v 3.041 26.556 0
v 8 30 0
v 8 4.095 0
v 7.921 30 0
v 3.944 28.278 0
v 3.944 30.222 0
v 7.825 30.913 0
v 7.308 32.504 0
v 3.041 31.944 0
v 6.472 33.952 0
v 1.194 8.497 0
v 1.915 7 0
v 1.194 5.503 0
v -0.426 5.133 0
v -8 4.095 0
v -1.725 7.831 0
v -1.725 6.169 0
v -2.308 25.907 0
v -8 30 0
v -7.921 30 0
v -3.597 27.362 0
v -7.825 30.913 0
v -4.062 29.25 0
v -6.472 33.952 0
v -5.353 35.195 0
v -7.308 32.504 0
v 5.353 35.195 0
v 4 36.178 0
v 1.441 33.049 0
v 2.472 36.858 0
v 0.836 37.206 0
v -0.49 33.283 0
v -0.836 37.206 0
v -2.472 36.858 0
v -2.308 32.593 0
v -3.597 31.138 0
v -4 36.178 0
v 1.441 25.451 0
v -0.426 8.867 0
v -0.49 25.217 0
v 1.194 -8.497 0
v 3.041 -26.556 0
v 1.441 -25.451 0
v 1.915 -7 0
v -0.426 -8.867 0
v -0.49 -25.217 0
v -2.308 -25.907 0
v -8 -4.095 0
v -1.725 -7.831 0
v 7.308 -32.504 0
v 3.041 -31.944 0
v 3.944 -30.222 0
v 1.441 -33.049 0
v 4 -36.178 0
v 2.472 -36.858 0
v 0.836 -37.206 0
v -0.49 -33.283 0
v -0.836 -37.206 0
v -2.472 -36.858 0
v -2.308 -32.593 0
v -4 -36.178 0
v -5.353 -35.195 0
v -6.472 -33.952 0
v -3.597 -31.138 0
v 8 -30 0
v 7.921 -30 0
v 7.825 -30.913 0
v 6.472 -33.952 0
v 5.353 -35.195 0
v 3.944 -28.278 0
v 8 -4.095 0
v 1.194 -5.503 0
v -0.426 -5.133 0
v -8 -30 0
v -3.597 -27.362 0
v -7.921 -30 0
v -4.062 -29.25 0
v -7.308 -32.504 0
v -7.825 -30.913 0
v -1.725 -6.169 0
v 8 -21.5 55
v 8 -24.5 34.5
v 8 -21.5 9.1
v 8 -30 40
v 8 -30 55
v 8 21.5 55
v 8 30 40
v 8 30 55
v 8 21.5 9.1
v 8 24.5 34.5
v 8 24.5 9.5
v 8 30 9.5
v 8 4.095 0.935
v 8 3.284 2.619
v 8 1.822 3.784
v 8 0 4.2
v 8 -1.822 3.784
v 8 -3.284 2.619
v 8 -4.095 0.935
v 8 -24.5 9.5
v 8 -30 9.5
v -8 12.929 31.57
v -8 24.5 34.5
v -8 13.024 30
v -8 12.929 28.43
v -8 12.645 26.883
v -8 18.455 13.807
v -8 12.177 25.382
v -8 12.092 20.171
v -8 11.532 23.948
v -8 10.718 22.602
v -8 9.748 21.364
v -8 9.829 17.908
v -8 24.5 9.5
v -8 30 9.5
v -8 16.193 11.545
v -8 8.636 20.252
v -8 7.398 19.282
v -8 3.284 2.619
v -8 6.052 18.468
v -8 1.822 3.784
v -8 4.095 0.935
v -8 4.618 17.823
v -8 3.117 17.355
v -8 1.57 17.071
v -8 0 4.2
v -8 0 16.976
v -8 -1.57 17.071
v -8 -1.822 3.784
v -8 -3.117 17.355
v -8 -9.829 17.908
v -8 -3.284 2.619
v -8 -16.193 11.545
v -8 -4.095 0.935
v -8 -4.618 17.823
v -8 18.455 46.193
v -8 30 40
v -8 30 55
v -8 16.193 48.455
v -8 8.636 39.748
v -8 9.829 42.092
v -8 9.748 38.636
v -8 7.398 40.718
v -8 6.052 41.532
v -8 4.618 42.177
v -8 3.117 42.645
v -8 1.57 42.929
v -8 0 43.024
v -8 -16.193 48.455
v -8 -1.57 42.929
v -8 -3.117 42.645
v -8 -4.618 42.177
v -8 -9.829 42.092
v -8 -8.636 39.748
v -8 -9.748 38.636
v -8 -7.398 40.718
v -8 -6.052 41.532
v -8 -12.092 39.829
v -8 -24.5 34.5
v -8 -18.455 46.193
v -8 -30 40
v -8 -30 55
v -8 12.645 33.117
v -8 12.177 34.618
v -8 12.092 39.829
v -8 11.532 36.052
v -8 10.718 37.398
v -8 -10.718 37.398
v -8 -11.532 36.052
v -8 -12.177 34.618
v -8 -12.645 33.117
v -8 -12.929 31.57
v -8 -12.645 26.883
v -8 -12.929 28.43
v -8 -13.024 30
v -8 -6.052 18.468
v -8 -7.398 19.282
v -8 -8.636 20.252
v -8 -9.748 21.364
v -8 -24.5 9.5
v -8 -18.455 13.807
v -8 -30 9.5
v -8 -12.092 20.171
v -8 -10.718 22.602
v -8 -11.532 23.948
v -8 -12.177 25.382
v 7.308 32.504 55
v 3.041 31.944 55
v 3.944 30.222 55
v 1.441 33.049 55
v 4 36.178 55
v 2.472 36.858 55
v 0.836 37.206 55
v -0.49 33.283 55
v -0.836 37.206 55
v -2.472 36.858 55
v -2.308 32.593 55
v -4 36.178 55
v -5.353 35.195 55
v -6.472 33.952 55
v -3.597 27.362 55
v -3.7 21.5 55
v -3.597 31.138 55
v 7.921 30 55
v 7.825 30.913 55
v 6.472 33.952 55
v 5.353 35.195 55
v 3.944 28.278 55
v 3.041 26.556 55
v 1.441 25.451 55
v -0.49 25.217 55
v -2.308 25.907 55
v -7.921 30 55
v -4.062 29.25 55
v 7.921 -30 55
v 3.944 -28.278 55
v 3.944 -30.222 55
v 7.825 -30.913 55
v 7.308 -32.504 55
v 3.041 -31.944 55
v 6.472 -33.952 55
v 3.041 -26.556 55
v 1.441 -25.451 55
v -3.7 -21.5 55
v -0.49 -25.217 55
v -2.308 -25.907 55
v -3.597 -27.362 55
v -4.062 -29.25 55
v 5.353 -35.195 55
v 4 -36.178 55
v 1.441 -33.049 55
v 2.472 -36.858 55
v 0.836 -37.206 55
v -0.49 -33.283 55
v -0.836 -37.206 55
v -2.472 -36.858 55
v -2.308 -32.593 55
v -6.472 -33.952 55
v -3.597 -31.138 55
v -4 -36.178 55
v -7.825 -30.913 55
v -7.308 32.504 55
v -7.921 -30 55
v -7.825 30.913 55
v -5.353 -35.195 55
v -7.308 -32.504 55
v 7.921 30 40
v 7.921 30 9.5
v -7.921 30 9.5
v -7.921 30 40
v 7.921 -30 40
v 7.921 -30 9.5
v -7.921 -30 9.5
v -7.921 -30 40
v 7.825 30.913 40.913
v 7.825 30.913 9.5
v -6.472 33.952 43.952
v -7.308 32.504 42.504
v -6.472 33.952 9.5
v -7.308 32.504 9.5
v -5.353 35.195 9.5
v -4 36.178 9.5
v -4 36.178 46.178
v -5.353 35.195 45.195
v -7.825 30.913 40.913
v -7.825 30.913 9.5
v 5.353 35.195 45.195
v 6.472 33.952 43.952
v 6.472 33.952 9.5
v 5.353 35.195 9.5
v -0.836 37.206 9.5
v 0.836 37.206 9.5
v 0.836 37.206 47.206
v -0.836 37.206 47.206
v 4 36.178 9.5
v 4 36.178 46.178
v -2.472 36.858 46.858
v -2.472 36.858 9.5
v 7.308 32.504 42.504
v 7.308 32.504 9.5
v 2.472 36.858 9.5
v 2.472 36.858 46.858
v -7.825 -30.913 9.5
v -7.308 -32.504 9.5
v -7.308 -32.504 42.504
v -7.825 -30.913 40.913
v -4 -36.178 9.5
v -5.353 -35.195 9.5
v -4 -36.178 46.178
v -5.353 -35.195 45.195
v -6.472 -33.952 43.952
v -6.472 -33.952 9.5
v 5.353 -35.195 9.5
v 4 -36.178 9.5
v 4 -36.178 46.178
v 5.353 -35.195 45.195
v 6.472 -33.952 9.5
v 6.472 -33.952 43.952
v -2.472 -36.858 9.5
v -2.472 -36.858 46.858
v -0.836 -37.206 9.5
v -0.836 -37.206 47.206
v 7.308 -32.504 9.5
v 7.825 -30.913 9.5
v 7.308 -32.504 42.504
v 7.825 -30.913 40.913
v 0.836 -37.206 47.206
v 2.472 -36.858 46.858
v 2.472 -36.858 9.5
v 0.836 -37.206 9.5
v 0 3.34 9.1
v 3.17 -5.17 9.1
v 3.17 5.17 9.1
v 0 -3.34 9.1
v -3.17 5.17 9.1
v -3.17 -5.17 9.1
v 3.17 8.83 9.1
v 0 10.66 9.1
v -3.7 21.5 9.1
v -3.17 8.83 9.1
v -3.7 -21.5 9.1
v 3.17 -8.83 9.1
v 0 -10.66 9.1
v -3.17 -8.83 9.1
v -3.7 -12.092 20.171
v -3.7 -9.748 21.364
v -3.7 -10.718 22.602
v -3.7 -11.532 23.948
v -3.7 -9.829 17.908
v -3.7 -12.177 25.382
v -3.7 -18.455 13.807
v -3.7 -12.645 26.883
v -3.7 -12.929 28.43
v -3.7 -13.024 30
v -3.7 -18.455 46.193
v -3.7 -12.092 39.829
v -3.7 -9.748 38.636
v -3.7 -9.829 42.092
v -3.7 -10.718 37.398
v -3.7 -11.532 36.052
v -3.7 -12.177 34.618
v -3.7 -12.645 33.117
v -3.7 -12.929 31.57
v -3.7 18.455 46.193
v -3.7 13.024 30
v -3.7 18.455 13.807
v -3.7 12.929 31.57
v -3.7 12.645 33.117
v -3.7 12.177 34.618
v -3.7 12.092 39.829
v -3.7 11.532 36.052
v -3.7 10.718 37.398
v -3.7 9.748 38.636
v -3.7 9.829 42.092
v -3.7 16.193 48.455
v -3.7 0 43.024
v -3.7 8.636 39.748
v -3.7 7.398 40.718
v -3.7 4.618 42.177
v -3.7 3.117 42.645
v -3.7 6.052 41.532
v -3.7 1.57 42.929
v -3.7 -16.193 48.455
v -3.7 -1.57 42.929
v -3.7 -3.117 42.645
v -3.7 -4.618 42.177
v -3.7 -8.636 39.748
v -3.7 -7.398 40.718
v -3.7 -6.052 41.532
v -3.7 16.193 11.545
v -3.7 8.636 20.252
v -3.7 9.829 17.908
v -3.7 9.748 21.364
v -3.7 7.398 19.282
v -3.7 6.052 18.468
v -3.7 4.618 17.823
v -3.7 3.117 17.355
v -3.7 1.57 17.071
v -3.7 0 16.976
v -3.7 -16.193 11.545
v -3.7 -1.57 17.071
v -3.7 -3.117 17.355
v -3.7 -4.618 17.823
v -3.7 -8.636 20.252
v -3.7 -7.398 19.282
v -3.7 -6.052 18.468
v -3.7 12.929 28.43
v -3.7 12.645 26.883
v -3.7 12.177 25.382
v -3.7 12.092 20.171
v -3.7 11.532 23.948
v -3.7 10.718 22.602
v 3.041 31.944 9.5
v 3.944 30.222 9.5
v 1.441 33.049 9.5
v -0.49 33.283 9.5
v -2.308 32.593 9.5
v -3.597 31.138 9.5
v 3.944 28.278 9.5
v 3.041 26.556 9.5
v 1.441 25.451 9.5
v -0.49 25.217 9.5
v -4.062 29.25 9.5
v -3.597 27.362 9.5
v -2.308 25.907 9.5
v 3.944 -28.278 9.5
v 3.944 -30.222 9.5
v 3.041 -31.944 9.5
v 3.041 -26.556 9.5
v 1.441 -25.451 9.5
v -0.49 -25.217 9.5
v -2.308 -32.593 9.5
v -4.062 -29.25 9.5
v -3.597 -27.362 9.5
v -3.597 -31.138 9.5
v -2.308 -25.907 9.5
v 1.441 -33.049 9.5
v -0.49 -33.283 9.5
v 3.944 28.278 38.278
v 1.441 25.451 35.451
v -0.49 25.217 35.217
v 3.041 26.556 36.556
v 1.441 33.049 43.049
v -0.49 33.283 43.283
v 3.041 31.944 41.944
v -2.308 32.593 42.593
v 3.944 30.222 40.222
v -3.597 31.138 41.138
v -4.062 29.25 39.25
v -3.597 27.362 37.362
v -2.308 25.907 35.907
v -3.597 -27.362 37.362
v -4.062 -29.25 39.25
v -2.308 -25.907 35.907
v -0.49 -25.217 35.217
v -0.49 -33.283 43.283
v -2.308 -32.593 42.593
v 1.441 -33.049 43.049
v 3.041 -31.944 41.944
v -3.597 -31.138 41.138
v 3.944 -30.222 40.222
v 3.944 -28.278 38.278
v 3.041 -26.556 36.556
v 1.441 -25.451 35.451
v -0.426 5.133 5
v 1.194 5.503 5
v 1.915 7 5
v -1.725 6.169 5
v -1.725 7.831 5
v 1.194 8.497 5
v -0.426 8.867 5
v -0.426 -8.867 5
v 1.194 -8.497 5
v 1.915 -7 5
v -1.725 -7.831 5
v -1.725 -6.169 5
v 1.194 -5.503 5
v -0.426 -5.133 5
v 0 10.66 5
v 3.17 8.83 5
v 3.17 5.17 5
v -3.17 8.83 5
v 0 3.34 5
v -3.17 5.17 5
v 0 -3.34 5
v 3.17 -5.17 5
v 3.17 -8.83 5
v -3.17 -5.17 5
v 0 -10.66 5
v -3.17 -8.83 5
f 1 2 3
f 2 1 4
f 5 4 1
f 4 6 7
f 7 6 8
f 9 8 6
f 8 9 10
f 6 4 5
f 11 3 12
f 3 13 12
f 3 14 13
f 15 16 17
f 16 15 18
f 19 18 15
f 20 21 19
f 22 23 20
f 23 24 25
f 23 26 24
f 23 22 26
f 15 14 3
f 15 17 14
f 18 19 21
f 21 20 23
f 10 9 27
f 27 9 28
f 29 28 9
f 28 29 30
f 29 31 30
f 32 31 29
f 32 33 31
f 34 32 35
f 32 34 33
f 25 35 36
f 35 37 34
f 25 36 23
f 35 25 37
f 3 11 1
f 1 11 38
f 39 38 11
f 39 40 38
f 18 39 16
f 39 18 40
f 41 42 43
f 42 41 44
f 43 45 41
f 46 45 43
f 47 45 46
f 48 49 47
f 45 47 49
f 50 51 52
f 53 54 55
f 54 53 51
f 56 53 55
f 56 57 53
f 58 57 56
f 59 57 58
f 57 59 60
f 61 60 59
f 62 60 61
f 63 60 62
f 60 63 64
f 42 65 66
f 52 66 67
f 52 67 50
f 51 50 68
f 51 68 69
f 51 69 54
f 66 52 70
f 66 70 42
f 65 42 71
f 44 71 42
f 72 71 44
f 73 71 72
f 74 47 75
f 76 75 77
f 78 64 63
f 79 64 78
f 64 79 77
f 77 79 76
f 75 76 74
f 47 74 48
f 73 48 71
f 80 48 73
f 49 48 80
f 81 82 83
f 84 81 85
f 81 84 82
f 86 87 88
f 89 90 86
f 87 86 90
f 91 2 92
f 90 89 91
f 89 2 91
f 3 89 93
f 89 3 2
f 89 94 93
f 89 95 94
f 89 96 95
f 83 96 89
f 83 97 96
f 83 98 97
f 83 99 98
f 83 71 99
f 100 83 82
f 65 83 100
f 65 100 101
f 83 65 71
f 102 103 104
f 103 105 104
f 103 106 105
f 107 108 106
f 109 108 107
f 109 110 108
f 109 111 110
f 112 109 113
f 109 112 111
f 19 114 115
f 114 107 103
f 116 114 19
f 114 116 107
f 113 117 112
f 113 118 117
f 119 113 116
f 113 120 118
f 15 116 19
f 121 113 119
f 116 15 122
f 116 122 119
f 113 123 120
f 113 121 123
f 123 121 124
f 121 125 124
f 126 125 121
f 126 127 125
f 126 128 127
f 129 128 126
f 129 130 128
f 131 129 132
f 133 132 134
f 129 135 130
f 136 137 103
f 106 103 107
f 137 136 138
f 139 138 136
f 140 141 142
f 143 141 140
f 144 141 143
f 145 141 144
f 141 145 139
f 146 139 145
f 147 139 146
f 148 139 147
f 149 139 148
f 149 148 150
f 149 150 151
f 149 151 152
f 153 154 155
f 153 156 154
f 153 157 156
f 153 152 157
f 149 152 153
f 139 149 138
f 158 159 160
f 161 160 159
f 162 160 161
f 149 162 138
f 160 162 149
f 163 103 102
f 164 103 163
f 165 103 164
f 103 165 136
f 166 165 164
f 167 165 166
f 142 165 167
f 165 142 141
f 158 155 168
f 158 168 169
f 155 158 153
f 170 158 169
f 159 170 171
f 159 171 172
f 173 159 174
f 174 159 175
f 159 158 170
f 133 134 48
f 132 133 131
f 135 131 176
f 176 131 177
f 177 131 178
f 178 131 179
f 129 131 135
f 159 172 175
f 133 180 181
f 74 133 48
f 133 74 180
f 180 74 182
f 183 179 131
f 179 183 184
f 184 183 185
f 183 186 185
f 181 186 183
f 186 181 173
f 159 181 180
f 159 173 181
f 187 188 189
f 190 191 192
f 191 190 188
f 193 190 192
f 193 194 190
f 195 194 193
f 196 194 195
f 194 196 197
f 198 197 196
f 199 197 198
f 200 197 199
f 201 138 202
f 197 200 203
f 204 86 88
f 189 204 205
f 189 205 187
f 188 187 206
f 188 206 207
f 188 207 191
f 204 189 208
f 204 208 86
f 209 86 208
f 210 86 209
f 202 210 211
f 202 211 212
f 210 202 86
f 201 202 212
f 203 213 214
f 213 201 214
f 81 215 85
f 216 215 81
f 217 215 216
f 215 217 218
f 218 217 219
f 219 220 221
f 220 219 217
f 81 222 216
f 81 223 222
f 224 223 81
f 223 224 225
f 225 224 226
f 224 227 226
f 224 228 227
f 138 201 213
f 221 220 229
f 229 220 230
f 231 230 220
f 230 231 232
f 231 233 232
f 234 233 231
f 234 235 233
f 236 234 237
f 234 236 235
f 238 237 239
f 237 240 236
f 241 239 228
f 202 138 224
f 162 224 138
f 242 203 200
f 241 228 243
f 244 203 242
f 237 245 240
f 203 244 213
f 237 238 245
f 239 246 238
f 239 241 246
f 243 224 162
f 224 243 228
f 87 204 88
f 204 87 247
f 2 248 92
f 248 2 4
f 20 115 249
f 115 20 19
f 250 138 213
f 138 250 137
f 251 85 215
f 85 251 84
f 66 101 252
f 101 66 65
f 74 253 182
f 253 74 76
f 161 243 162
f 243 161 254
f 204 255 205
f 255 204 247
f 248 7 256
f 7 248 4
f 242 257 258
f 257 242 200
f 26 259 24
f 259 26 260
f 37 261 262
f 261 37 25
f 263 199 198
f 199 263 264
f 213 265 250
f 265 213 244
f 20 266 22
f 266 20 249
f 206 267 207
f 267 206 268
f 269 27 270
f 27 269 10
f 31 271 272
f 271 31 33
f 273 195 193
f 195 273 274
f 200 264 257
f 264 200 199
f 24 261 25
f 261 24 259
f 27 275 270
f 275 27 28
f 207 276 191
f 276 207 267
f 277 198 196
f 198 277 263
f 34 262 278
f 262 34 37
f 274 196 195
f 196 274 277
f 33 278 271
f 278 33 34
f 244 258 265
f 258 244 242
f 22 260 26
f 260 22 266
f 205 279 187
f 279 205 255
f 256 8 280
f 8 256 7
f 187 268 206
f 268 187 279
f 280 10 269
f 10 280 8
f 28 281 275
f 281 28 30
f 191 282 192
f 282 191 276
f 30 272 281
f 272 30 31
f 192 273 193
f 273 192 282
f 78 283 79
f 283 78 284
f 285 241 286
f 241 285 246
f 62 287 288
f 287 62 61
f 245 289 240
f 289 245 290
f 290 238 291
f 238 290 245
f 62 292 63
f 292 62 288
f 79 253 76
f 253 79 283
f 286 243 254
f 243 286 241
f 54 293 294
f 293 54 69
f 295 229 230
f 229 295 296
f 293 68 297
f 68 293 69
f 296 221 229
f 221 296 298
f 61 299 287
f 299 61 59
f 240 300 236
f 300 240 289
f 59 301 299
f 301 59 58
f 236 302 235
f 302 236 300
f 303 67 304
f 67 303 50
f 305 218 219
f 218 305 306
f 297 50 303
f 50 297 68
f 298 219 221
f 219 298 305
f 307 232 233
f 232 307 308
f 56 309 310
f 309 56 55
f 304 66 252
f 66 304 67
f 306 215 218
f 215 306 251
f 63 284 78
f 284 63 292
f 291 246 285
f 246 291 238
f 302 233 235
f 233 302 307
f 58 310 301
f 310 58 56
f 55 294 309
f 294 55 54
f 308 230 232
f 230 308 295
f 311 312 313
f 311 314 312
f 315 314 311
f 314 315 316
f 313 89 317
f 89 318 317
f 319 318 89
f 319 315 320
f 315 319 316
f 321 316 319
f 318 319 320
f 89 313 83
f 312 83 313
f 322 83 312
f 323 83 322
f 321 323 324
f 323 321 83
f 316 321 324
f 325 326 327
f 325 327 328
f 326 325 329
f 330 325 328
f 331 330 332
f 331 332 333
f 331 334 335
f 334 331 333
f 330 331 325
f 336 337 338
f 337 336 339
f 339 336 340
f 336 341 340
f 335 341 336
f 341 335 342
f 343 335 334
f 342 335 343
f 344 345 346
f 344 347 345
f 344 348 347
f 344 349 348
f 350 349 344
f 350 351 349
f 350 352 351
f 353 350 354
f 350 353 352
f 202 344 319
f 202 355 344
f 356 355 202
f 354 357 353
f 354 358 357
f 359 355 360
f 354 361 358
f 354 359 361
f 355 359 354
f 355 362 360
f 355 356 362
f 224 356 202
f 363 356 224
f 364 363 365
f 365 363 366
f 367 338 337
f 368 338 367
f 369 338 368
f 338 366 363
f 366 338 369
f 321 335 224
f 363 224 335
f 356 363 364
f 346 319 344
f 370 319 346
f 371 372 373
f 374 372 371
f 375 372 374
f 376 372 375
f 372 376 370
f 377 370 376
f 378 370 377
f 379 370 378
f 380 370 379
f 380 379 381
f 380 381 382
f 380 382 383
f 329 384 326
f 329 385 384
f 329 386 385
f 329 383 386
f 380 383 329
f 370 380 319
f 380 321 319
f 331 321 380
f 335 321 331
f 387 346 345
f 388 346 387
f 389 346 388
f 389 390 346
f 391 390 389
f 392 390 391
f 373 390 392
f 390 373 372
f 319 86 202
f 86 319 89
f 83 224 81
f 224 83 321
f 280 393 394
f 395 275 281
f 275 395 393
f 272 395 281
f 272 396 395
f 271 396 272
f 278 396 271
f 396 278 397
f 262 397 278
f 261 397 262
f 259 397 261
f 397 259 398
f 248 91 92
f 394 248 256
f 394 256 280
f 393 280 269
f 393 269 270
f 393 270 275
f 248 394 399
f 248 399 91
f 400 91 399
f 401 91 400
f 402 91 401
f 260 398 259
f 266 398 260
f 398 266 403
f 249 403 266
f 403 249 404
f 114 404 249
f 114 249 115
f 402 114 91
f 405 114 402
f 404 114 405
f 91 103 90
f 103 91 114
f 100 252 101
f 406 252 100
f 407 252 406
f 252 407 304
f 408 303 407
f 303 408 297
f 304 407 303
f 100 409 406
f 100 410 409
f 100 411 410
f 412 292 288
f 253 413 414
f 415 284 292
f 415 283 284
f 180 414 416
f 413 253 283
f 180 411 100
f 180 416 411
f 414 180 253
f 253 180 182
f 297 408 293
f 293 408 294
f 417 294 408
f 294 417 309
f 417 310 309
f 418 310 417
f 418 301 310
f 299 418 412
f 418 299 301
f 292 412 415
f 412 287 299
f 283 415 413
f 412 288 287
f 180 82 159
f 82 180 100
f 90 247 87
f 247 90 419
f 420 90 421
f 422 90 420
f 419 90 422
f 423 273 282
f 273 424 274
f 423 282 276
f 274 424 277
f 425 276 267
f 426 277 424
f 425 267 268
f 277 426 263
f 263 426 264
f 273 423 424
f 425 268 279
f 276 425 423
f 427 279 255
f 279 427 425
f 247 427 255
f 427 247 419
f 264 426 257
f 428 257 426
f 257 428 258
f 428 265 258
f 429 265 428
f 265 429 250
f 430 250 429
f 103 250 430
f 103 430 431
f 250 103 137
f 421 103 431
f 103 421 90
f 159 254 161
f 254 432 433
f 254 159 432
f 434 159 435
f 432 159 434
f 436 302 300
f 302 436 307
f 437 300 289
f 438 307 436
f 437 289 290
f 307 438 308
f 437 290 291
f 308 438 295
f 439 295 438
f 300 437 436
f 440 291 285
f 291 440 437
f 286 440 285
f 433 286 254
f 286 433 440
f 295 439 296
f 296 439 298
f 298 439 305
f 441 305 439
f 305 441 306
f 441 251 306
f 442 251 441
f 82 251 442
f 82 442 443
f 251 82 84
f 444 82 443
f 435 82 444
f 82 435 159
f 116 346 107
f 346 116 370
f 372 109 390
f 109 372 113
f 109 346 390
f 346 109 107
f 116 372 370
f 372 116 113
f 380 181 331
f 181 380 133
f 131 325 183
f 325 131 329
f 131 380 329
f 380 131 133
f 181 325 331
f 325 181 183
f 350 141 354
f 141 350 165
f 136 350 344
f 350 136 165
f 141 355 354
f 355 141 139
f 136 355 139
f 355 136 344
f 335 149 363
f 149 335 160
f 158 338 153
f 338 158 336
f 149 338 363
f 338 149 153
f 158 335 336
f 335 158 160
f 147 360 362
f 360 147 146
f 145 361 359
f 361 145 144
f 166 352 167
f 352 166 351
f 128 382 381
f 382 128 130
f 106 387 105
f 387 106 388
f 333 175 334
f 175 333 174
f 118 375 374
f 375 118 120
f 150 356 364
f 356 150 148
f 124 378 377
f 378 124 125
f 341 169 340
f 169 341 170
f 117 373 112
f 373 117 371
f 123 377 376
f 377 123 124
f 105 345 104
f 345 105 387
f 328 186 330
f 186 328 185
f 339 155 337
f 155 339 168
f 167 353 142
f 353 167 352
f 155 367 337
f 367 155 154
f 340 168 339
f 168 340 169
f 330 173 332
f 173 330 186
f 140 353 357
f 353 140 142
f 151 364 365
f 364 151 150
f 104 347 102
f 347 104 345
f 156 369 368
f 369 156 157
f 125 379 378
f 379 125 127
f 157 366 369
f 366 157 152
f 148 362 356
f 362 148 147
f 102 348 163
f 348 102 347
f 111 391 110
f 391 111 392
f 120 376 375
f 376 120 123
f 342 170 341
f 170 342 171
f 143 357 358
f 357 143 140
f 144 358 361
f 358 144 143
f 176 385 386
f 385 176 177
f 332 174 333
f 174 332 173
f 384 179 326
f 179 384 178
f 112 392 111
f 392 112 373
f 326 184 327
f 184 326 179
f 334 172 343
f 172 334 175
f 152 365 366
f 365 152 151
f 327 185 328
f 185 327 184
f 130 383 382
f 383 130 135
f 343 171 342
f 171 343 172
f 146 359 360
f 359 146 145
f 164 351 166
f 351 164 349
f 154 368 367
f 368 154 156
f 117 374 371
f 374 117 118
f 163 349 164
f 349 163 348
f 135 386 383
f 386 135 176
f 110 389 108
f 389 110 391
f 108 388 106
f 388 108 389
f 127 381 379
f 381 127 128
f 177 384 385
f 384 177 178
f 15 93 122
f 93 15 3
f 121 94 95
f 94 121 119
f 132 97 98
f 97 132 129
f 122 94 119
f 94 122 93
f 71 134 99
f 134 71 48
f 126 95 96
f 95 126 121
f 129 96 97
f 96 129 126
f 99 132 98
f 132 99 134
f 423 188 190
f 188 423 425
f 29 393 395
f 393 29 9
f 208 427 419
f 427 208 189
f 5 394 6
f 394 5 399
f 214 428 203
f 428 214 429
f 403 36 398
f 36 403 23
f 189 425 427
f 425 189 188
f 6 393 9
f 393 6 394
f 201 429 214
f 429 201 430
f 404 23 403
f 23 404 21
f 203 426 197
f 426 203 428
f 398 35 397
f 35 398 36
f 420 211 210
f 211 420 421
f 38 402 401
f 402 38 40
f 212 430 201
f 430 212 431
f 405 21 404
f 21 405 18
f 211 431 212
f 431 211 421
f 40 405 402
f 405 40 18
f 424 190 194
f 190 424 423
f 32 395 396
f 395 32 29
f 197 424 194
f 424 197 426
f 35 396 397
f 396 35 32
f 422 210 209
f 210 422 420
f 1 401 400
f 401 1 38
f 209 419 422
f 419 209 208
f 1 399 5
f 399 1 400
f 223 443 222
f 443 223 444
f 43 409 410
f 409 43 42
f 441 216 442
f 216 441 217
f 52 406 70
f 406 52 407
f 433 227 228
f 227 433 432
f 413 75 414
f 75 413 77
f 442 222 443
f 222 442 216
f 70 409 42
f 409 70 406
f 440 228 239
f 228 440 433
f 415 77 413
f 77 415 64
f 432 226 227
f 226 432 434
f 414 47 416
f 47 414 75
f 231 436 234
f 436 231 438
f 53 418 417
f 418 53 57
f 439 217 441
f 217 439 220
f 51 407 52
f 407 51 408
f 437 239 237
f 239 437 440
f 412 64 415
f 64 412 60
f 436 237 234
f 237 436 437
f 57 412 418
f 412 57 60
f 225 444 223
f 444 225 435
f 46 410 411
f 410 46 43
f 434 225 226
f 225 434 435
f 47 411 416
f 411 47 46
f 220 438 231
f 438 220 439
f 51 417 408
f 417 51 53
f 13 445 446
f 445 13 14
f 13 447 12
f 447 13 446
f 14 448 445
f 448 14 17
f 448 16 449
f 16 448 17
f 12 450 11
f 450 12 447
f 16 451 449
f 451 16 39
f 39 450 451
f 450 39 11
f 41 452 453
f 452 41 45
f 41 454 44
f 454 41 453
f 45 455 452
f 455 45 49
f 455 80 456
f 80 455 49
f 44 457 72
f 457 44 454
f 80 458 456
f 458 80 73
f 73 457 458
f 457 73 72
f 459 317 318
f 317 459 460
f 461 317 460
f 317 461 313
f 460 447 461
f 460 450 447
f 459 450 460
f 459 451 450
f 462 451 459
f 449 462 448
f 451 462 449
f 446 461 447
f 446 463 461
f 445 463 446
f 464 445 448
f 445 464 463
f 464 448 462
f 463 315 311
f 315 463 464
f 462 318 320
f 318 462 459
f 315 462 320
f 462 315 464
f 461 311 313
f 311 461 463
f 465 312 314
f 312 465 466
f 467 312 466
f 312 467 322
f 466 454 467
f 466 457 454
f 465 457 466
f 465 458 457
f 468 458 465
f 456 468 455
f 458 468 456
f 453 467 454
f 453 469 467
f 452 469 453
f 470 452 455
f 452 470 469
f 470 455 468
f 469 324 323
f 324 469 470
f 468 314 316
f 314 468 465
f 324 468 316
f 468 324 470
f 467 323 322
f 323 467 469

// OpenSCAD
// file: functions.scad
// PRUSA Mendel  
// Functions used in many files
// GNU GPL v3
// Josef Průša
// josefprusa@me.com
// prusadjs.cz
// http://www.reprap.org/wiki/Prusa_Mendel
// http://github.com/prusajr/PrusaMendel


module nut(d,h,horizontal=true){
cornerdiameter =  (d / 2) / cos (180 / 6);
cylinder(h = h, r = cornerdiameter, $fn = 6);
if(horizontal){
for(i = [1:6]){
	rotate([0,0,60*i]) translate([-cornerdiameter-0.2,0,0]) rotate([0,0,-45]) cube(size = [2,2,h]);
}}
}

// Based on nophead research
module polyhole(d,h) {
    n = max(round(2 * d),3);
    rotate([0,0,180])
        cylinder(h = h, r = (d / 2) / cos (180 / n), $fn = n);
}




module roundcorner(diameter){
	difference(){
		cube(size = [diameter,diameter,99], center = false);
		translate(v = [diameter, diameter, 0]) cylinder(h = 100, r=diameter, center=true);
	}
}
// file: metric.scad
// PRUSA Mendel  
// Default metric sizes
// GNU GPL v3
// Josef Průša
// josefprusa@me.com
// prusadjs.cz
// http://www.reprap.org/wiki/Prusa_Mendel
// http://github.com/prusajr/PrusaMendel

// DONT CHANGE THIS FILE! ALTER VALUES IN CONFIGURATION.SCAD INSTEAD

// RODS

threaded_rod_diameter = 8.7;
threaded_rod_diameter_horizontal = 8.7;
smooth_bar_diameter = 8;
smooth_bar_diameter_horizontal = 8.5;

// Nuts and bolts

m8_diameter = 9;
m8_nut_diameter = 14.1;

m4_diameter = 4.5;
m4_nut_diameter = 9;

m3_diameter = 3.6;
m3_nut_diameter = 5.3;
m3_nut_diameter_horizontal = 6.1;

// Bushing holder

bushing_core_diameter = smooth_bar_diameter;
bushing_material_thickness = 1;

// Motors

motor_shaft = 5.5;
// file: configuration.scad
// PRUSA Mendel  
// Configuration file
// GNU GPL v3
// Josef Průša
// josefprusa@me.com
// prusadjs.cz
// http://www.reprap.org/wiki/Prusa_Mendel
// http://github.com/prusajr/PrusaMendel

// PLEASE SELECT ONE OF THE CONFIGURATIONS BELOW
// BY UN-COMMENTING IT

// Uncomment for metric settings
// METRIC METRIC METRIC METRIC METRIC METRIC METRIC METRIC 

include <metric.scad>;

// CUSTOM CUSTOM CUSTOM CUSTOM CUSTOM CUSTOM CUSTOM CUSTOM CUSTOM

thin_wall = 3;


// Linear bearing version
linear = true;
// set false for LM-8UU, true for LM-E-8UU (ignore if linear is set to false)
lme8uu = false;



// CHANGE ONLY THE STUFF YOU KNOW
// IT WILL REPLACE DEFAULT SETTING

// RODS
threaded_rod_diameter = 9.1;
threaded_rod_diameter_horizontal = 0;
// smooth_bar_diameter = 0;
// smooth_bar_diameter_horizontal = 0;

// Nuts and bolts

m8_diameter = 8.125;
m8_nut_diameter = 13;

m4_diameter = 4.5;
m4_nut_diameter = 8.1;

m3_diameter = 3.45;
m3_nut_diameter = 6.34;

motor_shaft = 5.65;

// Bushing holder

// bushing_core_diameter = smooth_bar_diameter;
// bushing_material_thickness = 0;


///counted stuff
m3_nut_diameter_bigger = ((m3_nut_diameter  / 2) / cos (180 / 6))*2;
//m3_nut_diameter = m3_nut_diameter_bigger;
// functions 
include <functions.scad>
// main file
// PRUSA Mendel  
// Z motor mount
// Used for mounting Z motors
// GNU GPL v2
// Josef Průša
// josefprusa@me.com
// prusadjs.cz
// http://www.reprap.org/wiki/Prusa_Mendel
// http://github.com/prusajr/PrusaMendel
include <configuration.scad>

/**
 * @id z-motor-mount
 * @name Z motor mount
 * @category Printed
 * @using 2 m3x25xhex
 * @using 2 m3nut
 * @using 2 m3washer
 * @using 4 m8nut
 * @using 4 m8washer
 * @using 1 rod-clamp
 */
 
module zmotormount(){
difference(){
union(){
translate(v=[2.5,0,0]) cube(size = [55,60,16], center = true);
translate(v=[2.5,0,-4]) cube(size = [55,74.5-16,8], center = true);
translate(v=[-25,29.25,0]) rotate(a=[0,90,0]) cylinder(h = 55, r=8, $fn=30);
translate(v=[-25,-29.25,0]) rotate(a=[0,90,0]) cylinder(h = 55, r=8, $fn=30);
}
translate(v=[-2.1,0,2.8]) cube(size = [46,43,13], center = true);

// reducing the material
translate(v=[10.5-2.5,34.5,-4]) cube(size = [25,20,30], center = true);
translate(v=[10.5-2.5,-34.5,-4]) cube(size = [25,20,30], center = true);
translate(v=[-10,0,0]) translate(v=[5.5,24.5,-10]) rotate(a=[0,0,45]) cube(size = [20,20,30]);
translate(v=[-10,0,0]) translate(v=[5.5,-24.5,-10]) rotate(a=[0,0,225]) cube(size = [20,20,30]);

// Nema 17
rotate ([0,0,45]) translate([20,0,0]) cube(size = [9,3.2,25], center = true);
rotate ([0,0,-45]) translate([20,0,0]) cube(size = [9,3.2,25], center = true);
rotate ([0,0,135]) translate([20,0,0]) cube(size = [9,3.2,25], center = true);
rotate ([0,0,-135]) translate([20,0,0]) cube(size = [9,3.2,25], center = true);
translate(v=[0,0,-10])polyhole(26,20);

translate(v=[30,0,-10]) cylinder(h = 20, r=4.2);
#translate(v=[-26,29.25,0]) rotate(a=[0,90,0]) cylinder(h = 58, r=m8_diameter/2);
translate(v=[-26,-29.25,0]) rotate(a=[0,90,0]) cylinder(h = 58, r=m8_diameter/2);


translate(v=[16,7,0]) rotate(a=[0,90,0]) polyhole(m3_diameter,15);
translate(v=[16,-7,0]) rotate(a=[0,90,0]) polyhole(m3_diameter,15);
translate(v=[0,7,0]) #rotate(a=[0,90,0]) rotate(a=[0,0,30]) nut(m3_nut_diameter, 25, false);
translate(v=[0,-7,0]) rotate(a=[0,90,0]) rotate(a=[0,0,30]) nut(m3_nut_diameter, 25, false);

}
}
translate(v=[0,0,30]) rotate ([0,90,0]) zmotormount();
